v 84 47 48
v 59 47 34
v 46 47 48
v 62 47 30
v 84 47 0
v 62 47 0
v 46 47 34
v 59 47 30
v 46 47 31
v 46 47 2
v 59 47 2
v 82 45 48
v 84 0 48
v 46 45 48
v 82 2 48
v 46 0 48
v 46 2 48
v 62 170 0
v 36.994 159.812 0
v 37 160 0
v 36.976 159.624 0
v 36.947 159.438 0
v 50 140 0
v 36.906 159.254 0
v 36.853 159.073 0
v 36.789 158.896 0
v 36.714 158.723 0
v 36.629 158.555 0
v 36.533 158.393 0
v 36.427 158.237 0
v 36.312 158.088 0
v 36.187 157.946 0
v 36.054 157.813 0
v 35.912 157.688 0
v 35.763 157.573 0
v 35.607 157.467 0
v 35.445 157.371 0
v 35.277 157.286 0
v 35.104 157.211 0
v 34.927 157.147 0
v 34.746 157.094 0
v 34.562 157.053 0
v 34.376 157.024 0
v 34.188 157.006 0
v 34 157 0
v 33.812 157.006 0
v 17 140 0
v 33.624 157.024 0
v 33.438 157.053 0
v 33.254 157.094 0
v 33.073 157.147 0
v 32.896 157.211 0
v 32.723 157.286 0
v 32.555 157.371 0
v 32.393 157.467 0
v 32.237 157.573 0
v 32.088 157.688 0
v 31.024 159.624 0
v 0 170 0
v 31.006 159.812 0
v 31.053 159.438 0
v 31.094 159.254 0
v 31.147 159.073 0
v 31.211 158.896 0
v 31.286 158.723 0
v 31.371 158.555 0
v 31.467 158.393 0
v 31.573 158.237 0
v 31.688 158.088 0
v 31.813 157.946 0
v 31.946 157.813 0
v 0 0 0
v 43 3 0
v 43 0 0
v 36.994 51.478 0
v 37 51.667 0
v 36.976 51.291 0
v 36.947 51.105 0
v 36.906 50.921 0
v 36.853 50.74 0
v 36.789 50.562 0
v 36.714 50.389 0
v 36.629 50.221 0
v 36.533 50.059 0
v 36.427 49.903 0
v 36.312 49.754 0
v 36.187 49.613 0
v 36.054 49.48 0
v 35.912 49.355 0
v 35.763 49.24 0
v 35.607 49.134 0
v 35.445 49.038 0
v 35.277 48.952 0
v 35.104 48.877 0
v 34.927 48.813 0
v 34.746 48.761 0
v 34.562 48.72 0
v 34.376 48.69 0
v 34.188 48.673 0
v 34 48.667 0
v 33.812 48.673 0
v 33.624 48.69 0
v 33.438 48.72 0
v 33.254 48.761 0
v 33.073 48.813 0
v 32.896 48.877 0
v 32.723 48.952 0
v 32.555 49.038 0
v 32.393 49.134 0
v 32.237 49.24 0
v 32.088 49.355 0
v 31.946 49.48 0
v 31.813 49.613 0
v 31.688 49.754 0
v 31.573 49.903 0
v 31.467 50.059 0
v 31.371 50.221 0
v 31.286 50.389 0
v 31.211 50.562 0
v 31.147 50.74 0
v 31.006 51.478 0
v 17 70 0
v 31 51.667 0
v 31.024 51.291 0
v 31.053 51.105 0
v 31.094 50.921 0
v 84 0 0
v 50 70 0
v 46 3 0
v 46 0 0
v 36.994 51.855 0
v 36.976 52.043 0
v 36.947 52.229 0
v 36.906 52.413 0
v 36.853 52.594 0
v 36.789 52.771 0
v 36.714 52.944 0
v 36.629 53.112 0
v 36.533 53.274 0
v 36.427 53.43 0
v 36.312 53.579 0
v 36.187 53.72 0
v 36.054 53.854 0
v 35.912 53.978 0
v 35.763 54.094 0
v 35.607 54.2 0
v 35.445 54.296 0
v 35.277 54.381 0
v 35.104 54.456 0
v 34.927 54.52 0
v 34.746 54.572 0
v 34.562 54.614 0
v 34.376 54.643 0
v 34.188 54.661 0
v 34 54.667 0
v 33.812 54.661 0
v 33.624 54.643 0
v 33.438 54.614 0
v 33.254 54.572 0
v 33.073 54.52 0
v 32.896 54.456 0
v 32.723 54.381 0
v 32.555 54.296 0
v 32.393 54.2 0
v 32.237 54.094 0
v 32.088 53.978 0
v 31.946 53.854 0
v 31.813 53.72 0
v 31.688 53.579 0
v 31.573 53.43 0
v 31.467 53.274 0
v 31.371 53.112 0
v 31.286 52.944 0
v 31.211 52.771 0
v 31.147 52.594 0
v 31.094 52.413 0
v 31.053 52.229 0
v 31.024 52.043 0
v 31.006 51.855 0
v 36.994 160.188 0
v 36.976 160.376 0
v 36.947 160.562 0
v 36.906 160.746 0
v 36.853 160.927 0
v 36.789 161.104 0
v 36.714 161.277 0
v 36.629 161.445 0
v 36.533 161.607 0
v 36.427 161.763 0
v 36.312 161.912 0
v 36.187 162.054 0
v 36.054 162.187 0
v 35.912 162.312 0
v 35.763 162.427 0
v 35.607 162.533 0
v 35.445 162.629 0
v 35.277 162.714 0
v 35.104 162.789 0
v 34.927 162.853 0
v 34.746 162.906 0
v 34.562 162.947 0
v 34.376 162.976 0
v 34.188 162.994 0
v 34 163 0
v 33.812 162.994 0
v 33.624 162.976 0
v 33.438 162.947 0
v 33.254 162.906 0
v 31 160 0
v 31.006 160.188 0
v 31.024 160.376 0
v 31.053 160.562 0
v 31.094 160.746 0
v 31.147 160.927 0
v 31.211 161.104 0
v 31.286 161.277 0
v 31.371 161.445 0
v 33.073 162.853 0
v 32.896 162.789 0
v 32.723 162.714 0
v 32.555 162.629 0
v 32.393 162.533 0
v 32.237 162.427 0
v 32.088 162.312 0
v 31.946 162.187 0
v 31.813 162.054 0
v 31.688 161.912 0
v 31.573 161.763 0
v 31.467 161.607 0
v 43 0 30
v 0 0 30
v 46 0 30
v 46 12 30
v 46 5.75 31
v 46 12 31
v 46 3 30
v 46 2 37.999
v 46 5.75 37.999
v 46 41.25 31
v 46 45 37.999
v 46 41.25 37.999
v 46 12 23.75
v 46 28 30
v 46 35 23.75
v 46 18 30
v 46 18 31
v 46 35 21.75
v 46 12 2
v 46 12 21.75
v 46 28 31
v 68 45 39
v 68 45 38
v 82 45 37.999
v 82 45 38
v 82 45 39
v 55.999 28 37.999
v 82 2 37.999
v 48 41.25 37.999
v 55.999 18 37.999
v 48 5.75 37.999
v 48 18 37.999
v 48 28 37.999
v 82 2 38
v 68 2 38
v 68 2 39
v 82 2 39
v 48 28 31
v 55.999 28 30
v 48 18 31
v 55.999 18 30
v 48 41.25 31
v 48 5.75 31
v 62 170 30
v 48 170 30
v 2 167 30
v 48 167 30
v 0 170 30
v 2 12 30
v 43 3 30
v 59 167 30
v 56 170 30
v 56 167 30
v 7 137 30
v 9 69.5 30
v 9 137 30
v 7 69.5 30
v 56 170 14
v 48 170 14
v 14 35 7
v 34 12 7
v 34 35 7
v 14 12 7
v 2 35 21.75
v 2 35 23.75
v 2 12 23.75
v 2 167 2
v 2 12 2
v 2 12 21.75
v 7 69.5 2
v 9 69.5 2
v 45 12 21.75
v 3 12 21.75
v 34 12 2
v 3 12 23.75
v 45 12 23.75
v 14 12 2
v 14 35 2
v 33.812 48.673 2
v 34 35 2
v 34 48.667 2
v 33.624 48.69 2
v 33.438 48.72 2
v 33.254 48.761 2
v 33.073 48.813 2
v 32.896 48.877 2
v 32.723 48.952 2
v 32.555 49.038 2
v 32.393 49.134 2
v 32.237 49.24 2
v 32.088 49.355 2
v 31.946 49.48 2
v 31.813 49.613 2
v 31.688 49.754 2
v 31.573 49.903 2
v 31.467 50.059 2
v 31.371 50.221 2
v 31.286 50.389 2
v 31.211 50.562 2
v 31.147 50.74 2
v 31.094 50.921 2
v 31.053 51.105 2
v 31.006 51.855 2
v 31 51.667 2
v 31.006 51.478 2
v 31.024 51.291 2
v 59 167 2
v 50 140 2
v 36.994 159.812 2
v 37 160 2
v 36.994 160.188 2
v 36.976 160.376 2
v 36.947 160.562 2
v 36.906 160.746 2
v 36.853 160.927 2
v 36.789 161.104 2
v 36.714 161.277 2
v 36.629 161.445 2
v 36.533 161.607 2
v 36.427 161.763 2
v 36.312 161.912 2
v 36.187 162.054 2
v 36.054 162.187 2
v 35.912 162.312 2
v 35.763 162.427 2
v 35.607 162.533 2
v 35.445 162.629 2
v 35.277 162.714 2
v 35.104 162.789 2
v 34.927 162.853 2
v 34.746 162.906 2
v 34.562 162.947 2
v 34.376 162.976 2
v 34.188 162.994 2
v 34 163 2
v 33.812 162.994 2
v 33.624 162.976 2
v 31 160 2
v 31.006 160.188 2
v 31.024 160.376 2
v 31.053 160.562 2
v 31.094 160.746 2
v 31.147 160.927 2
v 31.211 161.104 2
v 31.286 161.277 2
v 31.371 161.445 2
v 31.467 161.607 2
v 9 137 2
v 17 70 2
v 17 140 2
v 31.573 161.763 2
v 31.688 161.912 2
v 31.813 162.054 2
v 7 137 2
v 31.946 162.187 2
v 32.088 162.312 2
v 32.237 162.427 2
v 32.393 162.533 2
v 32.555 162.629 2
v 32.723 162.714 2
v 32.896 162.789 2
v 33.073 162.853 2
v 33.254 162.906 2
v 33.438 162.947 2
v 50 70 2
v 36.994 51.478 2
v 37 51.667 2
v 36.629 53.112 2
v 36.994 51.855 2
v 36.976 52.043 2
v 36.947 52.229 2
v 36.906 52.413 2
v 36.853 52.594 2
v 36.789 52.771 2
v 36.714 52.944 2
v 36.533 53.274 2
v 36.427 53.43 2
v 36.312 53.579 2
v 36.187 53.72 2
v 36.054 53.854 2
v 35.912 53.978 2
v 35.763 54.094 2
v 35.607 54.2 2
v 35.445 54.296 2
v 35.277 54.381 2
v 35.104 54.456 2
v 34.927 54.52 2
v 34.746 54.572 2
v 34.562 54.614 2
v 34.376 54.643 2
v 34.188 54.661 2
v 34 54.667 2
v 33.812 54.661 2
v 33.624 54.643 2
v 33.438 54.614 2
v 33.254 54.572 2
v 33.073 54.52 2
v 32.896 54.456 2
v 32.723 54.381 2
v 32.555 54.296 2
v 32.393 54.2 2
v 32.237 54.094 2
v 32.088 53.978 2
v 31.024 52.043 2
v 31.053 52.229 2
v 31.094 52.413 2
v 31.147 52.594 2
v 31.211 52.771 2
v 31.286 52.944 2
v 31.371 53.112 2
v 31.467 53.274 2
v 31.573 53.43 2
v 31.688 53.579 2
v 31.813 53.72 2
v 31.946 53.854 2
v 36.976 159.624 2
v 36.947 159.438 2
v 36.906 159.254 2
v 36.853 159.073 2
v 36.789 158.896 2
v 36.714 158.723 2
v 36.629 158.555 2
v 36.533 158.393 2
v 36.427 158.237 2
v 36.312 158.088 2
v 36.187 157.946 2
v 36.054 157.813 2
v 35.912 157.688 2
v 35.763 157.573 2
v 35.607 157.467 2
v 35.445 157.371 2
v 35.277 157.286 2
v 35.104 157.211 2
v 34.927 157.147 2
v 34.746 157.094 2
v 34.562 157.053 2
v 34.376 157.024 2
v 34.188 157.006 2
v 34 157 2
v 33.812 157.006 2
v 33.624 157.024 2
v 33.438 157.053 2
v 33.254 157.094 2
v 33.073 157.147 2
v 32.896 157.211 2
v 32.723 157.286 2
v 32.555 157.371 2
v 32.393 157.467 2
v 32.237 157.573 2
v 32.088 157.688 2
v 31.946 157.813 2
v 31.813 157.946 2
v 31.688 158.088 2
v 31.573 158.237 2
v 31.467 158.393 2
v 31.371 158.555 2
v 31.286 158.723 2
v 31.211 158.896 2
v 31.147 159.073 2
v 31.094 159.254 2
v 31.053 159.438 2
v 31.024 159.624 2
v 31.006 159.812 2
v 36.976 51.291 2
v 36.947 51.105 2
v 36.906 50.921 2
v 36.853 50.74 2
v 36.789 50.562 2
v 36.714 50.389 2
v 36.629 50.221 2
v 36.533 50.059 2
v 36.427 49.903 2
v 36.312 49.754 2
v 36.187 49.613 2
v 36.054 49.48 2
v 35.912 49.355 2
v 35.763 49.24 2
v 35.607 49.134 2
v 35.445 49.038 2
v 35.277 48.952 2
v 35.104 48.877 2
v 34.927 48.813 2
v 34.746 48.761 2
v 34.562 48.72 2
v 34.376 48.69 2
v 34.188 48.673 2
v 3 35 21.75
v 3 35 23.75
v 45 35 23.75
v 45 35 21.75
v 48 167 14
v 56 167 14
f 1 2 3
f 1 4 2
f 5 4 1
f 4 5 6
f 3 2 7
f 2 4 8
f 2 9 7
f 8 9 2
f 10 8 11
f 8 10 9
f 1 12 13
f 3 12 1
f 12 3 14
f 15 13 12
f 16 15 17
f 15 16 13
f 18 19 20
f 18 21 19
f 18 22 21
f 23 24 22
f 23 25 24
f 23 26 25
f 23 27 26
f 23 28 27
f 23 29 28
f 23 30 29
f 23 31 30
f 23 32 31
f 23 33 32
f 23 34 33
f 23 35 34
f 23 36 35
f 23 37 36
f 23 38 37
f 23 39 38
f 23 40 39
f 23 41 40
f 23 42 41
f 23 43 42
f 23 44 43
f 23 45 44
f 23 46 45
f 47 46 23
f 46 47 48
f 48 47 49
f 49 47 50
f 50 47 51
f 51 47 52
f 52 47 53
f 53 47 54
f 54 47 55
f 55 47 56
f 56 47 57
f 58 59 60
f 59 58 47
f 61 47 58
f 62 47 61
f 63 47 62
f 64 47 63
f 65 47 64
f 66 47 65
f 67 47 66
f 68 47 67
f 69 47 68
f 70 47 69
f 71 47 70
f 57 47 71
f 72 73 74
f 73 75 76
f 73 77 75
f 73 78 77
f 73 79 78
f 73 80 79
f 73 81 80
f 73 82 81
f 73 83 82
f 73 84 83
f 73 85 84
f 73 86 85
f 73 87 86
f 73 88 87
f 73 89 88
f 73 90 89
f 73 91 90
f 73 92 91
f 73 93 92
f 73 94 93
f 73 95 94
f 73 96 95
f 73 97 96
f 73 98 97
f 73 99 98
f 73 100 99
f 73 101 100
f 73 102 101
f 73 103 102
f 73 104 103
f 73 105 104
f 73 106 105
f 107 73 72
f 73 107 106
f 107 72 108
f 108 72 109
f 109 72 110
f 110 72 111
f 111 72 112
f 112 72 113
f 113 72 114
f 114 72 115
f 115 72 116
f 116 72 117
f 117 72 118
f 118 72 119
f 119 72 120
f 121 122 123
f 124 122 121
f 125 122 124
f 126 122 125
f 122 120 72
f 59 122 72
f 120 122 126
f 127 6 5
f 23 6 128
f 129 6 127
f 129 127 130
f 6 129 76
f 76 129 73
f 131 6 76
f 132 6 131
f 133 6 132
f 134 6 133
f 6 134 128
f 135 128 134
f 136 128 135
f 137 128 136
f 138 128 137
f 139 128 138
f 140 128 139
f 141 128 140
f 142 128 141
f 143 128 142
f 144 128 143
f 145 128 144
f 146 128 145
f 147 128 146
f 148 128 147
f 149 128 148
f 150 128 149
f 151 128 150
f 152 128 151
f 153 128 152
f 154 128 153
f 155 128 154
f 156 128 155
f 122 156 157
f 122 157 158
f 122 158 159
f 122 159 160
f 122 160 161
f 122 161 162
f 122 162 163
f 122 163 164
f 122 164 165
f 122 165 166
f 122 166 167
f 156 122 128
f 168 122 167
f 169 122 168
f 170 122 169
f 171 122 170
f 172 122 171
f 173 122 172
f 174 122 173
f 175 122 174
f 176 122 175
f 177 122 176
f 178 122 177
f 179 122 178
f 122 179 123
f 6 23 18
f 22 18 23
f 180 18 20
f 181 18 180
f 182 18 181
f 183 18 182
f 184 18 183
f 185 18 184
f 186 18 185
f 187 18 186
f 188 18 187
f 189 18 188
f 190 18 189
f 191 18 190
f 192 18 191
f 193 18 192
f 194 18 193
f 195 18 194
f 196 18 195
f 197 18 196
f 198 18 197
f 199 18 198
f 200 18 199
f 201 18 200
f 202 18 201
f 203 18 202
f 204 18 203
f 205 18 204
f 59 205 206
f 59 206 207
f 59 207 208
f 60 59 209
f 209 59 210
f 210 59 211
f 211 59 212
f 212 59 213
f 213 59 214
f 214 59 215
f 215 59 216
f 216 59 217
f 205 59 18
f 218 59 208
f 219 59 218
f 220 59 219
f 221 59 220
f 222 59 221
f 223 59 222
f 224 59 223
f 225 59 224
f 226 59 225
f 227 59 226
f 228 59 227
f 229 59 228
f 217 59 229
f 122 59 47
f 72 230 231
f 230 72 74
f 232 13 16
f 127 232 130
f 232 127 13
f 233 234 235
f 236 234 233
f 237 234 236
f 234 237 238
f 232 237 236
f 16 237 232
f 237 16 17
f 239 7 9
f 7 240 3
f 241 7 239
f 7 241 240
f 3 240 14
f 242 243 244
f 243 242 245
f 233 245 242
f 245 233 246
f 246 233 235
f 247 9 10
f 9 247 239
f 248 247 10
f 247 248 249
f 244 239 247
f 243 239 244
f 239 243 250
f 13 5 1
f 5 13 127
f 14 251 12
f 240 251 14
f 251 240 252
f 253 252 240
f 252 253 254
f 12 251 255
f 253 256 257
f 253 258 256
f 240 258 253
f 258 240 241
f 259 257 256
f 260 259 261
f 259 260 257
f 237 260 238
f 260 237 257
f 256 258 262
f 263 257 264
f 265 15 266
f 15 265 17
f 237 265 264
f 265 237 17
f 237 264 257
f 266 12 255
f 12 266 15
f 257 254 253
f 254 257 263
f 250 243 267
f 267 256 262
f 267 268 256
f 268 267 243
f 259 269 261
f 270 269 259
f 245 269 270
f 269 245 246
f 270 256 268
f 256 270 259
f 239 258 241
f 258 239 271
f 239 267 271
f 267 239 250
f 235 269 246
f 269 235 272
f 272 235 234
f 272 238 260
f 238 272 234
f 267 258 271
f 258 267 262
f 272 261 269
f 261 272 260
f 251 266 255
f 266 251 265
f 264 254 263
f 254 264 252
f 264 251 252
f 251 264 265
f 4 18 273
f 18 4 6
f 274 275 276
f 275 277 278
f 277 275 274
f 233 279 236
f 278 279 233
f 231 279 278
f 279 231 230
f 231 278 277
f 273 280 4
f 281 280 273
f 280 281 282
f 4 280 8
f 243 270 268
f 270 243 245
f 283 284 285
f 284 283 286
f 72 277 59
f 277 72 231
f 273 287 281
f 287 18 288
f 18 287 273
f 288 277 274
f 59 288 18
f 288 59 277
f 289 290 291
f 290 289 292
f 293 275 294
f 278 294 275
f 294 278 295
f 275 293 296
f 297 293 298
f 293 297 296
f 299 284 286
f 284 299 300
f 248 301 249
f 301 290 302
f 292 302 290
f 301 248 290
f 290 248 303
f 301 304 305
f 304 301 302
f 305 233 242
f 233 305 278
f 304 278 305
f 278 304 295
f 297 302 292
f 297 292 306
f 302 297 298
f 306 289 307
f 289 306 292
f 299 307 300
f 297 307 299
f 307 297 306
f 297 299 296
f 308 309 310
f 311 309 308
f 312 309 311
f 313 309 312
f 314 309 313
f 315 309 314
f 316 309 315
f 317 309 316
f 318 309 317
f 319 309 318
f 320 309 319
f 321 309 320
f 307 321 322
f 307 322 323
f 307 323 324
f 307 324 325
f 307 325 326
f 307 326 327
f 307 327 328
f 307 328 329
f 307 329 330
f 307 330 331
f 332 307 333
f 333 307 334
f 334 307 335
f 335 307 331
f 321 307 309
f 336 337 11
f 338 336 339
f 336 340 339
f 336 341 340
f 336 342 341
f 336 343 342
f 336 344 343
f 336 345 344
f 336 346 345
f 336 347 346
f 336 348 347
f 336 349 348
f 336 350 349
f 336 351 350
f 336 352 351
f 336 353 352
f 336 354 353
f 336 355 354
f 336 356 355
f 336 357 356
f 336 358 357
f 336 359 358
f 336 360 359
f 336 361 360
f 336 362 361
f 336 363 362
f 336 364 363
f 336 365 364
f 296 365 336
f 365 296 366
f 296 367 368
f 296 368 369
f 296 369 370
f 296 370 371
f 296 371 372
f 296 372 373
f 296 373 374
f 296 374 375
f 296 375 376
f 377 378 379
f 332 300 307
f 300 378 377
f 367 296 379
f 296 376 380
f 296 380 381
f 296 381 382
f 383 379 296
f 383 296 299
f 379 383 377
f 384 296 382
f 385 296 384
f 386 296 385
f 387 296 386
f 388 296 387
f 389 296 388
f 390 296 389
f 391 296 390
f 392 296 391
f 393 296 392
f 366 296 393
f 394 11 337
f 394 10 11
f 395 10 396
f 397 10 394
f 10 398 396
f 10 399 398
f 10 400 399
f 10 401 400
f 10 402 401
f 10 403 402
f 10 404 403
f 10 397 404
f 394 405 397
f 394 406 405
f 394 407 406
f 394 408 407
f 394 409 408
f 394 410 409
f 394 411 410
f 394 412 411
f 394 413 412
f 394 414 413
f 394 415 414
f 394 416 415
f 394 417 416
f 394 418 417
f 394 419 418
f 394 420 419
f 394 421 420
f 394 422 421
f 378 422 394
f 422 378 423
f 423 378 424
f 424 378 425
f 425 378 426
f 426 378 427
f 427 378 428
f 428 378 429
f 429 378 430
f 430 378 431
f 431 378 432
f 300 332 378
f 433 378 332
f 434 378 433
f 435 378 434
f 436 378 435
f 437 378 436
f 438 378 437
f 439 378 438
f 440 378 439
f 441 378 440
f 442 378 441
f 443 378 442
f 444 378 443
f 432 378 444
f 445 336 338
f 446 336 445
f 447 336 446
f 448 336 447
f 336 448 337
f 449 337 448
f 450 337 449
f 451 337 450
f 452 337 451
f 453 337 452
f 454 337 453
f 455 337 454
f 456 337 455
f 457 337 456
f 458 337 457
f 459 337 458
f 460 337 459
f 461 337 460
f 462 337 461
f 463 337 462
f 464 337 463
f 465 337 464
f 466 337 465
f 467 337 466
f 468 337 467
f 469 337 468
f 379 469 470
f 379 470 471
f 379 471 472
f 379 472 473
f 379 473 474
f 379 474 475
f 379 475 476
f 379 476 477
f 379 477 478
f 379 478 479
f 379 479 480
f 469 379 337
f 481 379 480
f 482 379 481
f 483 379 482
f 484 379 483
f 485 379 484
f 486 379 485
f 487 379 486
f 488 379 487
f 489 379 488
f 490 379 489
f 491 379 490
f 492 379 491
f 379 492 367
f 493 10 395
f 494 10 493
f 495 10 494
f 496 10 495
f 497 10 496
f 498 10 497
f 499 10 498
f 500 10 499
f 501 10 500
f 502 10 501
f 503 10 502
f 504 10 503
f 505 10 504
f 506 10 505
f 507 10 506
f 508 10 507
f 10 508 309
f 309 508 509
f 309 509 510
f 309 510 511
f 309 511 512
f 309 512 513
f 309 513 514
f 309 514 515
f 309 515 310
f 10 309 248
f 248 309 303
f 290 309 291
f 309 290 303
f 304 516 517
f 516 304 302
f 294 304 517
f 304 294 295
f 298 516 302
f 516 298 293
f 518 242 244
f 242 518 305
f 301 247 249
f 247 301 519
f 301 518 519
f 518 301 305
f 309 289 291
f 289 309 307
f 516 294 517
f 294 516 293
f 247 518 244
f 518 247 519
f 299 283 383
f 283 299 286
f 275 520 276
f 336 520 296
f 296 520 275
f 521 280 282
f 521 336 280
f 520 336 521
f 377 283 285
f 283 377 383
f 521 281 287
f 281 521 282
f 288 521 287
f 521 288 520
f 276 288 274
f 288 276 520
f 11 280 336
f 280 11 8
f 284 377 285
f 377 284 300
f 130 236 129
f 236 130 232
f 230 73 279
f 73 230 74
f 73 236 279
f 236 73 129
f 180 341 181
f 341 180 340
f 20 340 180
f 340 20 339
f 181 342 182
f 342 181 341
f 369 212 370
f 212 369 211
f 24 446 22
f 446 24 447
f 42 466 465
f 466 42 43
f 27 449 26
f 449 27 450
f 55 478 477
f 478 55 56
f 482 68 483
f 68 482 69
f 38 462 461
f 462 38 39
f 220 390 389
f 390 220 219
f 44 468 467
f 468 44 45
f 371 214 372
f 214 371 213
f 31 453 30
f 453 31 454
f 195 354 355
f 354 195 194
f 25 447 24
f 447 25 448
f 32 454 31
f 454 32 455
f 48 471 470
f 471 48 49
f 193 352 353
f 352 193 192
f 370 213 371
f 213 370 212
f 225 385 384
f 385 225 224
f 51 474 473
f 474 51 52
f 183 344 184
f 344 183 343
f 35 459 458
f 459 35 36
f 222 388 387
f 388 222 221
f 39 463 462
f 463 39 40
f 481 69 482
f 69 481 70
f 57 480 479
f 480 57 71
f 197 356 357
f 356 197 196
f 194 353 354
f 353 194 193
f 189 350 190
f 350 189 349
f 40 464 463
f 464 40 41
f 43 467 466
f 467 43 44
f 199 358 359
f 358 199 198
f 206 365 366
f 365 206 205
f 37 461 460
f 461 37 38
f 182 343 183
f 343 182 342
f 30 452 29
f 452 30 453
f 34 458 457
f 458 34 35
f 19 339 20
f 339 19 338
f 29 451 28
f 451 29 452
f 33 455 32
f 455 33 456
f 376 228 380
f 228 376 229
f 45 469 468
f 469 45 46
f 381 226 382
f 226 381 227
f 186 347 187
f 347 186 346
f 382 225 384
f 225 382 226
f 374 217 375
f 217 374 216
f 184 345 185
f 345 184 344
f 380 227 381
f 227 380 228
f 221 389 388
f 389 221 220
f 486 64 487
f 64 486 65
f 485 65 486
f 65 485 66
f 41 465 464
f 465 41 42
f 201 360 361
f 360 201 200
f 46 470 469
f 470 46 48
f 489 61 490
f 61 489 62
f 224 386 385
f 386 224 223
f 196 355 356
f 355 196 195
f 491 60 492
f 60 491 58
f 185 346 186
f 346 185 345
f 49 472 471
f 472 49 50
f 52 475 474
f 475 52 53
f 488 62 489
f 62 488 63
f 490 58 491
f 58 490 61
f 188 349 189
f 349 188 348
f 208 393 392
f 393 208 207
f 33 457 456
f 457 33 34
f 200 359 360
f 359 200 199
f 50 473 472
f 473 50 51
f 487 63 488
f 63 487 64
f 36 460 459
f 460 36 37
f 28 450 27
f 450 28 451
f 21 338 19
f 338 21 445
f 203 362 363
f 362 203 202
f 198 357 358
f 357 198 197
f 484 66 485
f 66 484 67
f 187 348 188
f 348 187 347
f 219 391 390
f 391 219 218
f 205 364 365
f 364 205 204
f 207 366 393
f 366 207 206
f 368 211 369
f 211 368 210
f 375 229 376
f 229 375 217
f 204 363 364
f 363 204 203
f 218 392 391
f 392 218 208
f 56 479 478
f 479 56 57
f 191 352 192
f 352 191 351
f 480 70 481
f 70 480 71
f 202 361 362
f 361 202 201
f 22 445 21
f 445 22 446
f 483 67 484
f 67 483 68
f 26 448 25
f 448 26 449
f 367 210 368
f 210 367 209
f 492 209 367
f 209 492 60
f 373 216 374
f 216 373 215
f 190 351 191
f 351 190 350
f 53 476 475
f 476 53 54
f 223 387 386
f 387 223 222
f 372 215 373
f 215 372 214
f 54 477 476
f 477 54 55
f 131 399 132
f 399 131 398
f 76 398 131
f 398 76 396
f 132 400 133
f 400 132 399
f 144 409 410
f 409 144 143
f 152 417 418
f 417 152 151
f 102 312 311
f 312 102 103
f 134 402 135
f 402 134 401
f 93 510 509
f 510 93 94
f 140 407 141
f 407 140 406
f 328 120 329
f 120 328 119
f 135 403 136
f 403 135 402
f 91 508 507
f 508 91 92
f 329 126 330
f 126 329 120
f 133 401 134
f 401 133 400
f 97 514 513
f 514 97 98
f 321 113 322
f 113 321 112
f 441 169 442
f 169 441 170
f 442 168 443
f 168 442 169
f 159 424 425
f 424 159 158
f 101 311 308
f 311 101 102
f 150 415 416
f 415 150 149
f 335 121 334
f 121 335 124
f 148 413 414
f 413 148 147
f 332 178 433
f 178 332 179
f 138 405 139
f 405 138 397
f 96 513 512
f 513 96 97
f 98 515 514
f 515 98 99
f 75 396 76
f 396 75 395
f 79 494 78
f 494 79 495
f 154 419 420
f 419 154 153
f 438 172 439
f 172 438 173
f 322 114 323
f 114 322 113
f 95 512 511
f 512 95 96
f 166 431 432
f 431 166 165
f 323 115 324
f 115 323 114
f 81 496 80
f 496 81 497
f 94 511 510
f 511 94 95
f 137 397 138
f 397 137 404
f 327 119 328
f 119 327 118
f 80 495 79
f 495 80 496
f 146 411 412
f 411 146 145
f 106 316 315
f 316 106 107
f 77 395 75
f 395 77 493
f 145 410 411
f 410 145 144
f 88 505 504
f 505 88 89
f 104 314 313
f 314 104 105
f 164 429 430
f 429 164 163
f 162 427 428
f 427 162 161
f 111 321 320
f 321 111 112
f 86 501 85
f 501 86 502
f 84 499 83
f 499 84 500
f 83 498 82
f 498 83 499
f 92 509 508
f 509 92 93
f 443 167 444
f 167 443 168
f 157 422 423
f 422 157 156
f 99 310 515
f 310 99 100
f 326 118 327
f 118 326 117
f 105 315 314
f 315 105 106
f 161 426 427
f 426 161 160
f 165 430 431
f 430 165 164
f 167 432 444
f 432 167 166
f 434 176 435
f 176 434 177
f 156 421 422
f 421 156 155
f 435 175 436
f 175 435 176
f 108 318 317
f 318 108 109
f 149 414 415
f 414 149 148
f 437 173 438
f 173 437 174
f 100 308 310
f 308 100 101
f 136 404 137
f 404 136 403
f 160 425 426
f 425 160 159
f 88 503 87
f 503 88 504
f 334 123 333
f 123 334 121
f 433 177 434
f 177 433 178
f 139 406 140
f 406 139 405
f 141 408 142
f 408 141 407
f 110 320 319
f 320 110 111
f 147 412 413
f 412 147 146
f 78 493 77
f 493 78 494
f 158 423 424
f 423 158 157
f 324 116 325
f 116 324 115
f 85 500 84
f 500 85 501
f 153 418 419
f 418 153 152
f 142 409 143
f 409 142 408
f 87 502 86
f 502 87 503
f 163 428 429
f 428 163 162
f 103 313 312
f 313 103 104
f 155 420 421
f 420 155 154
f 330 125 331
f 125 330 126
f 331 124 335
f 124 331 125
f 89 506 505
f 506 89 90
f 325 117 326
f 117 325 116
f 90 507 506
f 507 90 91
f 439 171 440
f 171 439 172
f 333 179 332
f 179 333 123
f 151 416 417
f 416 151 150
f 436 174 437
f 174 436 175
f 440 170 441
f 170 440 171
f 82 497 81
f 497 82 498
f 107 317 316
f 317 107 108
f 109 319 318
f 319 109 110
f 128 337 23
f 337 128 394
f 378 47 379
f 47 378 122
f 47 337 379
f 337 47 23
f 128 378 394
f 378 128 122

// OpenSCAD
//
// ktRACK42
//
 
gap1 = 0.001;
gap2 = 0.002;
th = 2;

//bot
x = 43;
y = 37;
z = 25;
h = 33+5;

//cntrl
CW = 50;
CH = 120;//123;
CD = 32;

//sw
SW = 44;
SH = 23;
SH2 = SH*2.5;
SD = 24;//33;

SCW = 42.5;
SCH = 34.5;


//box
BW = 62;
BH = 170;//172;
BD = h+th;


base();
//case();


module case()
{
//color("blue")
{
difference()
{
    union()
    {
        translate([-th-1/2, -th-1/2, 0]) cube([BW+th*2+1, BH+th*2+1, h]);
    }
    translate([-1/2, -1/2, -gap1]) cube([BW+1, BH+1, h-th]);
    //wire
    translate([BW-th*3-8, BH-th-15+4, 0]) cube([8, 15+5, 20]);
    //bot
    translate([th+SW, th, 0]) bot_base();
    translate([th+SW, th, 30]) bot_base();
    
    translate([th, th+x/2-SCH/2, BD-5]) cube([SCW+3, SCH, 10]);
    
    
    //translate([-20, 60, 0]) cube([200, 200, 200]);
    
}
translate([th+SW-th-1/2, -1, 0]) cube([th, th+1, h]);
translate([th+SW-th-1/2, -1, 0]) rotate([0, -0.3, 0]) cube([th, th+1, h]);
translate([th+1, th+x/2-SCH/2+SCH, BD-5-15+1]) cube([SCW, th, 15]);
}
}

module base()
{
difference()
{
    union()
    {
        translate([0, 0, 0]) cube([BW, BH, 30]);
        translate([th+SW, th, 0]) bot_base();
    }
    //wire
    translate([th, x+th*2, th]) cube([5, CH, CD]);
    translate([th, BH-th-15-1-15, th]) cube([15, 15+15, CD]);
    translate([BW-th*3-8, BH-th-15+4, th+12]) cube([8, 15, CD]);
    //ctrl
    translate([th+5+th, x+th*2, th]) cube([CW, CH, CD]);
    //sw
    translate([th, th+x/2-SH/2, th]) sw();
    
    translate([th+SW-th-1, 0, 0]) cube([th+1, th+1, 30]);
    
    //neji
    translate([BW/2+3,  BH-20+10, -gap1]) cylinder(r1=6/2, r2=6/2, h=th+gap2, $fn=100);
    translate([BW/2+3,  BH/3-5, -gap1]) cylinder(r1=6/2, r2=6/2, h=th+gap2, $fn=100);
    
    translate([17, 70, -5]) cube([33, 70, 10]);
    
    //translate([0, 40, 0]) cube([200, 200, 200]);
    
}
}


module sw()
{
translate([0, 0, 5])
difference()
{
    union()
    {
        translate([0, 0, 0]) cube([SW, SH2, SD]);
        translate([    0, 0, -5]) cube([12, SH2, 5]);
        translate([SW-12, 0, -5]) cube([12, SH2, 5]);
    }
    translate([-5+1, -gap1, 14.75]) cube([5, SH2+gap2, 2]);
    translate([SW-1, -gap1, 14.75]) cube([5, SH2+gap2, 2]);
    
}
translate([0, SH, 0]) cube([SW, SH, SD+5]);
}



module bot_base()
{
translate([y-1, 0, h]) rotate([0, 0, 90])
{
difference()
{
    union()
    {
        translate([-th, -th, -h]) cube([x+th*2, y+th*1-1, z+h-15]);
    }
    //bot
    translate([0, 0, -gap1]) cube([x, y, z+gap2]);
    
    translate([x/2-5/2-3, y+th-13+gap1, -10-gap1]) cube([10, 13, z+10+gap2]);
    
    translate([x/2-(SCH+1)/2, y-3, -7]) cube([SCH+1, SCW, 10]);
}
translate([0, 0, 0]) cube([x, 14, 1]);
}
}
